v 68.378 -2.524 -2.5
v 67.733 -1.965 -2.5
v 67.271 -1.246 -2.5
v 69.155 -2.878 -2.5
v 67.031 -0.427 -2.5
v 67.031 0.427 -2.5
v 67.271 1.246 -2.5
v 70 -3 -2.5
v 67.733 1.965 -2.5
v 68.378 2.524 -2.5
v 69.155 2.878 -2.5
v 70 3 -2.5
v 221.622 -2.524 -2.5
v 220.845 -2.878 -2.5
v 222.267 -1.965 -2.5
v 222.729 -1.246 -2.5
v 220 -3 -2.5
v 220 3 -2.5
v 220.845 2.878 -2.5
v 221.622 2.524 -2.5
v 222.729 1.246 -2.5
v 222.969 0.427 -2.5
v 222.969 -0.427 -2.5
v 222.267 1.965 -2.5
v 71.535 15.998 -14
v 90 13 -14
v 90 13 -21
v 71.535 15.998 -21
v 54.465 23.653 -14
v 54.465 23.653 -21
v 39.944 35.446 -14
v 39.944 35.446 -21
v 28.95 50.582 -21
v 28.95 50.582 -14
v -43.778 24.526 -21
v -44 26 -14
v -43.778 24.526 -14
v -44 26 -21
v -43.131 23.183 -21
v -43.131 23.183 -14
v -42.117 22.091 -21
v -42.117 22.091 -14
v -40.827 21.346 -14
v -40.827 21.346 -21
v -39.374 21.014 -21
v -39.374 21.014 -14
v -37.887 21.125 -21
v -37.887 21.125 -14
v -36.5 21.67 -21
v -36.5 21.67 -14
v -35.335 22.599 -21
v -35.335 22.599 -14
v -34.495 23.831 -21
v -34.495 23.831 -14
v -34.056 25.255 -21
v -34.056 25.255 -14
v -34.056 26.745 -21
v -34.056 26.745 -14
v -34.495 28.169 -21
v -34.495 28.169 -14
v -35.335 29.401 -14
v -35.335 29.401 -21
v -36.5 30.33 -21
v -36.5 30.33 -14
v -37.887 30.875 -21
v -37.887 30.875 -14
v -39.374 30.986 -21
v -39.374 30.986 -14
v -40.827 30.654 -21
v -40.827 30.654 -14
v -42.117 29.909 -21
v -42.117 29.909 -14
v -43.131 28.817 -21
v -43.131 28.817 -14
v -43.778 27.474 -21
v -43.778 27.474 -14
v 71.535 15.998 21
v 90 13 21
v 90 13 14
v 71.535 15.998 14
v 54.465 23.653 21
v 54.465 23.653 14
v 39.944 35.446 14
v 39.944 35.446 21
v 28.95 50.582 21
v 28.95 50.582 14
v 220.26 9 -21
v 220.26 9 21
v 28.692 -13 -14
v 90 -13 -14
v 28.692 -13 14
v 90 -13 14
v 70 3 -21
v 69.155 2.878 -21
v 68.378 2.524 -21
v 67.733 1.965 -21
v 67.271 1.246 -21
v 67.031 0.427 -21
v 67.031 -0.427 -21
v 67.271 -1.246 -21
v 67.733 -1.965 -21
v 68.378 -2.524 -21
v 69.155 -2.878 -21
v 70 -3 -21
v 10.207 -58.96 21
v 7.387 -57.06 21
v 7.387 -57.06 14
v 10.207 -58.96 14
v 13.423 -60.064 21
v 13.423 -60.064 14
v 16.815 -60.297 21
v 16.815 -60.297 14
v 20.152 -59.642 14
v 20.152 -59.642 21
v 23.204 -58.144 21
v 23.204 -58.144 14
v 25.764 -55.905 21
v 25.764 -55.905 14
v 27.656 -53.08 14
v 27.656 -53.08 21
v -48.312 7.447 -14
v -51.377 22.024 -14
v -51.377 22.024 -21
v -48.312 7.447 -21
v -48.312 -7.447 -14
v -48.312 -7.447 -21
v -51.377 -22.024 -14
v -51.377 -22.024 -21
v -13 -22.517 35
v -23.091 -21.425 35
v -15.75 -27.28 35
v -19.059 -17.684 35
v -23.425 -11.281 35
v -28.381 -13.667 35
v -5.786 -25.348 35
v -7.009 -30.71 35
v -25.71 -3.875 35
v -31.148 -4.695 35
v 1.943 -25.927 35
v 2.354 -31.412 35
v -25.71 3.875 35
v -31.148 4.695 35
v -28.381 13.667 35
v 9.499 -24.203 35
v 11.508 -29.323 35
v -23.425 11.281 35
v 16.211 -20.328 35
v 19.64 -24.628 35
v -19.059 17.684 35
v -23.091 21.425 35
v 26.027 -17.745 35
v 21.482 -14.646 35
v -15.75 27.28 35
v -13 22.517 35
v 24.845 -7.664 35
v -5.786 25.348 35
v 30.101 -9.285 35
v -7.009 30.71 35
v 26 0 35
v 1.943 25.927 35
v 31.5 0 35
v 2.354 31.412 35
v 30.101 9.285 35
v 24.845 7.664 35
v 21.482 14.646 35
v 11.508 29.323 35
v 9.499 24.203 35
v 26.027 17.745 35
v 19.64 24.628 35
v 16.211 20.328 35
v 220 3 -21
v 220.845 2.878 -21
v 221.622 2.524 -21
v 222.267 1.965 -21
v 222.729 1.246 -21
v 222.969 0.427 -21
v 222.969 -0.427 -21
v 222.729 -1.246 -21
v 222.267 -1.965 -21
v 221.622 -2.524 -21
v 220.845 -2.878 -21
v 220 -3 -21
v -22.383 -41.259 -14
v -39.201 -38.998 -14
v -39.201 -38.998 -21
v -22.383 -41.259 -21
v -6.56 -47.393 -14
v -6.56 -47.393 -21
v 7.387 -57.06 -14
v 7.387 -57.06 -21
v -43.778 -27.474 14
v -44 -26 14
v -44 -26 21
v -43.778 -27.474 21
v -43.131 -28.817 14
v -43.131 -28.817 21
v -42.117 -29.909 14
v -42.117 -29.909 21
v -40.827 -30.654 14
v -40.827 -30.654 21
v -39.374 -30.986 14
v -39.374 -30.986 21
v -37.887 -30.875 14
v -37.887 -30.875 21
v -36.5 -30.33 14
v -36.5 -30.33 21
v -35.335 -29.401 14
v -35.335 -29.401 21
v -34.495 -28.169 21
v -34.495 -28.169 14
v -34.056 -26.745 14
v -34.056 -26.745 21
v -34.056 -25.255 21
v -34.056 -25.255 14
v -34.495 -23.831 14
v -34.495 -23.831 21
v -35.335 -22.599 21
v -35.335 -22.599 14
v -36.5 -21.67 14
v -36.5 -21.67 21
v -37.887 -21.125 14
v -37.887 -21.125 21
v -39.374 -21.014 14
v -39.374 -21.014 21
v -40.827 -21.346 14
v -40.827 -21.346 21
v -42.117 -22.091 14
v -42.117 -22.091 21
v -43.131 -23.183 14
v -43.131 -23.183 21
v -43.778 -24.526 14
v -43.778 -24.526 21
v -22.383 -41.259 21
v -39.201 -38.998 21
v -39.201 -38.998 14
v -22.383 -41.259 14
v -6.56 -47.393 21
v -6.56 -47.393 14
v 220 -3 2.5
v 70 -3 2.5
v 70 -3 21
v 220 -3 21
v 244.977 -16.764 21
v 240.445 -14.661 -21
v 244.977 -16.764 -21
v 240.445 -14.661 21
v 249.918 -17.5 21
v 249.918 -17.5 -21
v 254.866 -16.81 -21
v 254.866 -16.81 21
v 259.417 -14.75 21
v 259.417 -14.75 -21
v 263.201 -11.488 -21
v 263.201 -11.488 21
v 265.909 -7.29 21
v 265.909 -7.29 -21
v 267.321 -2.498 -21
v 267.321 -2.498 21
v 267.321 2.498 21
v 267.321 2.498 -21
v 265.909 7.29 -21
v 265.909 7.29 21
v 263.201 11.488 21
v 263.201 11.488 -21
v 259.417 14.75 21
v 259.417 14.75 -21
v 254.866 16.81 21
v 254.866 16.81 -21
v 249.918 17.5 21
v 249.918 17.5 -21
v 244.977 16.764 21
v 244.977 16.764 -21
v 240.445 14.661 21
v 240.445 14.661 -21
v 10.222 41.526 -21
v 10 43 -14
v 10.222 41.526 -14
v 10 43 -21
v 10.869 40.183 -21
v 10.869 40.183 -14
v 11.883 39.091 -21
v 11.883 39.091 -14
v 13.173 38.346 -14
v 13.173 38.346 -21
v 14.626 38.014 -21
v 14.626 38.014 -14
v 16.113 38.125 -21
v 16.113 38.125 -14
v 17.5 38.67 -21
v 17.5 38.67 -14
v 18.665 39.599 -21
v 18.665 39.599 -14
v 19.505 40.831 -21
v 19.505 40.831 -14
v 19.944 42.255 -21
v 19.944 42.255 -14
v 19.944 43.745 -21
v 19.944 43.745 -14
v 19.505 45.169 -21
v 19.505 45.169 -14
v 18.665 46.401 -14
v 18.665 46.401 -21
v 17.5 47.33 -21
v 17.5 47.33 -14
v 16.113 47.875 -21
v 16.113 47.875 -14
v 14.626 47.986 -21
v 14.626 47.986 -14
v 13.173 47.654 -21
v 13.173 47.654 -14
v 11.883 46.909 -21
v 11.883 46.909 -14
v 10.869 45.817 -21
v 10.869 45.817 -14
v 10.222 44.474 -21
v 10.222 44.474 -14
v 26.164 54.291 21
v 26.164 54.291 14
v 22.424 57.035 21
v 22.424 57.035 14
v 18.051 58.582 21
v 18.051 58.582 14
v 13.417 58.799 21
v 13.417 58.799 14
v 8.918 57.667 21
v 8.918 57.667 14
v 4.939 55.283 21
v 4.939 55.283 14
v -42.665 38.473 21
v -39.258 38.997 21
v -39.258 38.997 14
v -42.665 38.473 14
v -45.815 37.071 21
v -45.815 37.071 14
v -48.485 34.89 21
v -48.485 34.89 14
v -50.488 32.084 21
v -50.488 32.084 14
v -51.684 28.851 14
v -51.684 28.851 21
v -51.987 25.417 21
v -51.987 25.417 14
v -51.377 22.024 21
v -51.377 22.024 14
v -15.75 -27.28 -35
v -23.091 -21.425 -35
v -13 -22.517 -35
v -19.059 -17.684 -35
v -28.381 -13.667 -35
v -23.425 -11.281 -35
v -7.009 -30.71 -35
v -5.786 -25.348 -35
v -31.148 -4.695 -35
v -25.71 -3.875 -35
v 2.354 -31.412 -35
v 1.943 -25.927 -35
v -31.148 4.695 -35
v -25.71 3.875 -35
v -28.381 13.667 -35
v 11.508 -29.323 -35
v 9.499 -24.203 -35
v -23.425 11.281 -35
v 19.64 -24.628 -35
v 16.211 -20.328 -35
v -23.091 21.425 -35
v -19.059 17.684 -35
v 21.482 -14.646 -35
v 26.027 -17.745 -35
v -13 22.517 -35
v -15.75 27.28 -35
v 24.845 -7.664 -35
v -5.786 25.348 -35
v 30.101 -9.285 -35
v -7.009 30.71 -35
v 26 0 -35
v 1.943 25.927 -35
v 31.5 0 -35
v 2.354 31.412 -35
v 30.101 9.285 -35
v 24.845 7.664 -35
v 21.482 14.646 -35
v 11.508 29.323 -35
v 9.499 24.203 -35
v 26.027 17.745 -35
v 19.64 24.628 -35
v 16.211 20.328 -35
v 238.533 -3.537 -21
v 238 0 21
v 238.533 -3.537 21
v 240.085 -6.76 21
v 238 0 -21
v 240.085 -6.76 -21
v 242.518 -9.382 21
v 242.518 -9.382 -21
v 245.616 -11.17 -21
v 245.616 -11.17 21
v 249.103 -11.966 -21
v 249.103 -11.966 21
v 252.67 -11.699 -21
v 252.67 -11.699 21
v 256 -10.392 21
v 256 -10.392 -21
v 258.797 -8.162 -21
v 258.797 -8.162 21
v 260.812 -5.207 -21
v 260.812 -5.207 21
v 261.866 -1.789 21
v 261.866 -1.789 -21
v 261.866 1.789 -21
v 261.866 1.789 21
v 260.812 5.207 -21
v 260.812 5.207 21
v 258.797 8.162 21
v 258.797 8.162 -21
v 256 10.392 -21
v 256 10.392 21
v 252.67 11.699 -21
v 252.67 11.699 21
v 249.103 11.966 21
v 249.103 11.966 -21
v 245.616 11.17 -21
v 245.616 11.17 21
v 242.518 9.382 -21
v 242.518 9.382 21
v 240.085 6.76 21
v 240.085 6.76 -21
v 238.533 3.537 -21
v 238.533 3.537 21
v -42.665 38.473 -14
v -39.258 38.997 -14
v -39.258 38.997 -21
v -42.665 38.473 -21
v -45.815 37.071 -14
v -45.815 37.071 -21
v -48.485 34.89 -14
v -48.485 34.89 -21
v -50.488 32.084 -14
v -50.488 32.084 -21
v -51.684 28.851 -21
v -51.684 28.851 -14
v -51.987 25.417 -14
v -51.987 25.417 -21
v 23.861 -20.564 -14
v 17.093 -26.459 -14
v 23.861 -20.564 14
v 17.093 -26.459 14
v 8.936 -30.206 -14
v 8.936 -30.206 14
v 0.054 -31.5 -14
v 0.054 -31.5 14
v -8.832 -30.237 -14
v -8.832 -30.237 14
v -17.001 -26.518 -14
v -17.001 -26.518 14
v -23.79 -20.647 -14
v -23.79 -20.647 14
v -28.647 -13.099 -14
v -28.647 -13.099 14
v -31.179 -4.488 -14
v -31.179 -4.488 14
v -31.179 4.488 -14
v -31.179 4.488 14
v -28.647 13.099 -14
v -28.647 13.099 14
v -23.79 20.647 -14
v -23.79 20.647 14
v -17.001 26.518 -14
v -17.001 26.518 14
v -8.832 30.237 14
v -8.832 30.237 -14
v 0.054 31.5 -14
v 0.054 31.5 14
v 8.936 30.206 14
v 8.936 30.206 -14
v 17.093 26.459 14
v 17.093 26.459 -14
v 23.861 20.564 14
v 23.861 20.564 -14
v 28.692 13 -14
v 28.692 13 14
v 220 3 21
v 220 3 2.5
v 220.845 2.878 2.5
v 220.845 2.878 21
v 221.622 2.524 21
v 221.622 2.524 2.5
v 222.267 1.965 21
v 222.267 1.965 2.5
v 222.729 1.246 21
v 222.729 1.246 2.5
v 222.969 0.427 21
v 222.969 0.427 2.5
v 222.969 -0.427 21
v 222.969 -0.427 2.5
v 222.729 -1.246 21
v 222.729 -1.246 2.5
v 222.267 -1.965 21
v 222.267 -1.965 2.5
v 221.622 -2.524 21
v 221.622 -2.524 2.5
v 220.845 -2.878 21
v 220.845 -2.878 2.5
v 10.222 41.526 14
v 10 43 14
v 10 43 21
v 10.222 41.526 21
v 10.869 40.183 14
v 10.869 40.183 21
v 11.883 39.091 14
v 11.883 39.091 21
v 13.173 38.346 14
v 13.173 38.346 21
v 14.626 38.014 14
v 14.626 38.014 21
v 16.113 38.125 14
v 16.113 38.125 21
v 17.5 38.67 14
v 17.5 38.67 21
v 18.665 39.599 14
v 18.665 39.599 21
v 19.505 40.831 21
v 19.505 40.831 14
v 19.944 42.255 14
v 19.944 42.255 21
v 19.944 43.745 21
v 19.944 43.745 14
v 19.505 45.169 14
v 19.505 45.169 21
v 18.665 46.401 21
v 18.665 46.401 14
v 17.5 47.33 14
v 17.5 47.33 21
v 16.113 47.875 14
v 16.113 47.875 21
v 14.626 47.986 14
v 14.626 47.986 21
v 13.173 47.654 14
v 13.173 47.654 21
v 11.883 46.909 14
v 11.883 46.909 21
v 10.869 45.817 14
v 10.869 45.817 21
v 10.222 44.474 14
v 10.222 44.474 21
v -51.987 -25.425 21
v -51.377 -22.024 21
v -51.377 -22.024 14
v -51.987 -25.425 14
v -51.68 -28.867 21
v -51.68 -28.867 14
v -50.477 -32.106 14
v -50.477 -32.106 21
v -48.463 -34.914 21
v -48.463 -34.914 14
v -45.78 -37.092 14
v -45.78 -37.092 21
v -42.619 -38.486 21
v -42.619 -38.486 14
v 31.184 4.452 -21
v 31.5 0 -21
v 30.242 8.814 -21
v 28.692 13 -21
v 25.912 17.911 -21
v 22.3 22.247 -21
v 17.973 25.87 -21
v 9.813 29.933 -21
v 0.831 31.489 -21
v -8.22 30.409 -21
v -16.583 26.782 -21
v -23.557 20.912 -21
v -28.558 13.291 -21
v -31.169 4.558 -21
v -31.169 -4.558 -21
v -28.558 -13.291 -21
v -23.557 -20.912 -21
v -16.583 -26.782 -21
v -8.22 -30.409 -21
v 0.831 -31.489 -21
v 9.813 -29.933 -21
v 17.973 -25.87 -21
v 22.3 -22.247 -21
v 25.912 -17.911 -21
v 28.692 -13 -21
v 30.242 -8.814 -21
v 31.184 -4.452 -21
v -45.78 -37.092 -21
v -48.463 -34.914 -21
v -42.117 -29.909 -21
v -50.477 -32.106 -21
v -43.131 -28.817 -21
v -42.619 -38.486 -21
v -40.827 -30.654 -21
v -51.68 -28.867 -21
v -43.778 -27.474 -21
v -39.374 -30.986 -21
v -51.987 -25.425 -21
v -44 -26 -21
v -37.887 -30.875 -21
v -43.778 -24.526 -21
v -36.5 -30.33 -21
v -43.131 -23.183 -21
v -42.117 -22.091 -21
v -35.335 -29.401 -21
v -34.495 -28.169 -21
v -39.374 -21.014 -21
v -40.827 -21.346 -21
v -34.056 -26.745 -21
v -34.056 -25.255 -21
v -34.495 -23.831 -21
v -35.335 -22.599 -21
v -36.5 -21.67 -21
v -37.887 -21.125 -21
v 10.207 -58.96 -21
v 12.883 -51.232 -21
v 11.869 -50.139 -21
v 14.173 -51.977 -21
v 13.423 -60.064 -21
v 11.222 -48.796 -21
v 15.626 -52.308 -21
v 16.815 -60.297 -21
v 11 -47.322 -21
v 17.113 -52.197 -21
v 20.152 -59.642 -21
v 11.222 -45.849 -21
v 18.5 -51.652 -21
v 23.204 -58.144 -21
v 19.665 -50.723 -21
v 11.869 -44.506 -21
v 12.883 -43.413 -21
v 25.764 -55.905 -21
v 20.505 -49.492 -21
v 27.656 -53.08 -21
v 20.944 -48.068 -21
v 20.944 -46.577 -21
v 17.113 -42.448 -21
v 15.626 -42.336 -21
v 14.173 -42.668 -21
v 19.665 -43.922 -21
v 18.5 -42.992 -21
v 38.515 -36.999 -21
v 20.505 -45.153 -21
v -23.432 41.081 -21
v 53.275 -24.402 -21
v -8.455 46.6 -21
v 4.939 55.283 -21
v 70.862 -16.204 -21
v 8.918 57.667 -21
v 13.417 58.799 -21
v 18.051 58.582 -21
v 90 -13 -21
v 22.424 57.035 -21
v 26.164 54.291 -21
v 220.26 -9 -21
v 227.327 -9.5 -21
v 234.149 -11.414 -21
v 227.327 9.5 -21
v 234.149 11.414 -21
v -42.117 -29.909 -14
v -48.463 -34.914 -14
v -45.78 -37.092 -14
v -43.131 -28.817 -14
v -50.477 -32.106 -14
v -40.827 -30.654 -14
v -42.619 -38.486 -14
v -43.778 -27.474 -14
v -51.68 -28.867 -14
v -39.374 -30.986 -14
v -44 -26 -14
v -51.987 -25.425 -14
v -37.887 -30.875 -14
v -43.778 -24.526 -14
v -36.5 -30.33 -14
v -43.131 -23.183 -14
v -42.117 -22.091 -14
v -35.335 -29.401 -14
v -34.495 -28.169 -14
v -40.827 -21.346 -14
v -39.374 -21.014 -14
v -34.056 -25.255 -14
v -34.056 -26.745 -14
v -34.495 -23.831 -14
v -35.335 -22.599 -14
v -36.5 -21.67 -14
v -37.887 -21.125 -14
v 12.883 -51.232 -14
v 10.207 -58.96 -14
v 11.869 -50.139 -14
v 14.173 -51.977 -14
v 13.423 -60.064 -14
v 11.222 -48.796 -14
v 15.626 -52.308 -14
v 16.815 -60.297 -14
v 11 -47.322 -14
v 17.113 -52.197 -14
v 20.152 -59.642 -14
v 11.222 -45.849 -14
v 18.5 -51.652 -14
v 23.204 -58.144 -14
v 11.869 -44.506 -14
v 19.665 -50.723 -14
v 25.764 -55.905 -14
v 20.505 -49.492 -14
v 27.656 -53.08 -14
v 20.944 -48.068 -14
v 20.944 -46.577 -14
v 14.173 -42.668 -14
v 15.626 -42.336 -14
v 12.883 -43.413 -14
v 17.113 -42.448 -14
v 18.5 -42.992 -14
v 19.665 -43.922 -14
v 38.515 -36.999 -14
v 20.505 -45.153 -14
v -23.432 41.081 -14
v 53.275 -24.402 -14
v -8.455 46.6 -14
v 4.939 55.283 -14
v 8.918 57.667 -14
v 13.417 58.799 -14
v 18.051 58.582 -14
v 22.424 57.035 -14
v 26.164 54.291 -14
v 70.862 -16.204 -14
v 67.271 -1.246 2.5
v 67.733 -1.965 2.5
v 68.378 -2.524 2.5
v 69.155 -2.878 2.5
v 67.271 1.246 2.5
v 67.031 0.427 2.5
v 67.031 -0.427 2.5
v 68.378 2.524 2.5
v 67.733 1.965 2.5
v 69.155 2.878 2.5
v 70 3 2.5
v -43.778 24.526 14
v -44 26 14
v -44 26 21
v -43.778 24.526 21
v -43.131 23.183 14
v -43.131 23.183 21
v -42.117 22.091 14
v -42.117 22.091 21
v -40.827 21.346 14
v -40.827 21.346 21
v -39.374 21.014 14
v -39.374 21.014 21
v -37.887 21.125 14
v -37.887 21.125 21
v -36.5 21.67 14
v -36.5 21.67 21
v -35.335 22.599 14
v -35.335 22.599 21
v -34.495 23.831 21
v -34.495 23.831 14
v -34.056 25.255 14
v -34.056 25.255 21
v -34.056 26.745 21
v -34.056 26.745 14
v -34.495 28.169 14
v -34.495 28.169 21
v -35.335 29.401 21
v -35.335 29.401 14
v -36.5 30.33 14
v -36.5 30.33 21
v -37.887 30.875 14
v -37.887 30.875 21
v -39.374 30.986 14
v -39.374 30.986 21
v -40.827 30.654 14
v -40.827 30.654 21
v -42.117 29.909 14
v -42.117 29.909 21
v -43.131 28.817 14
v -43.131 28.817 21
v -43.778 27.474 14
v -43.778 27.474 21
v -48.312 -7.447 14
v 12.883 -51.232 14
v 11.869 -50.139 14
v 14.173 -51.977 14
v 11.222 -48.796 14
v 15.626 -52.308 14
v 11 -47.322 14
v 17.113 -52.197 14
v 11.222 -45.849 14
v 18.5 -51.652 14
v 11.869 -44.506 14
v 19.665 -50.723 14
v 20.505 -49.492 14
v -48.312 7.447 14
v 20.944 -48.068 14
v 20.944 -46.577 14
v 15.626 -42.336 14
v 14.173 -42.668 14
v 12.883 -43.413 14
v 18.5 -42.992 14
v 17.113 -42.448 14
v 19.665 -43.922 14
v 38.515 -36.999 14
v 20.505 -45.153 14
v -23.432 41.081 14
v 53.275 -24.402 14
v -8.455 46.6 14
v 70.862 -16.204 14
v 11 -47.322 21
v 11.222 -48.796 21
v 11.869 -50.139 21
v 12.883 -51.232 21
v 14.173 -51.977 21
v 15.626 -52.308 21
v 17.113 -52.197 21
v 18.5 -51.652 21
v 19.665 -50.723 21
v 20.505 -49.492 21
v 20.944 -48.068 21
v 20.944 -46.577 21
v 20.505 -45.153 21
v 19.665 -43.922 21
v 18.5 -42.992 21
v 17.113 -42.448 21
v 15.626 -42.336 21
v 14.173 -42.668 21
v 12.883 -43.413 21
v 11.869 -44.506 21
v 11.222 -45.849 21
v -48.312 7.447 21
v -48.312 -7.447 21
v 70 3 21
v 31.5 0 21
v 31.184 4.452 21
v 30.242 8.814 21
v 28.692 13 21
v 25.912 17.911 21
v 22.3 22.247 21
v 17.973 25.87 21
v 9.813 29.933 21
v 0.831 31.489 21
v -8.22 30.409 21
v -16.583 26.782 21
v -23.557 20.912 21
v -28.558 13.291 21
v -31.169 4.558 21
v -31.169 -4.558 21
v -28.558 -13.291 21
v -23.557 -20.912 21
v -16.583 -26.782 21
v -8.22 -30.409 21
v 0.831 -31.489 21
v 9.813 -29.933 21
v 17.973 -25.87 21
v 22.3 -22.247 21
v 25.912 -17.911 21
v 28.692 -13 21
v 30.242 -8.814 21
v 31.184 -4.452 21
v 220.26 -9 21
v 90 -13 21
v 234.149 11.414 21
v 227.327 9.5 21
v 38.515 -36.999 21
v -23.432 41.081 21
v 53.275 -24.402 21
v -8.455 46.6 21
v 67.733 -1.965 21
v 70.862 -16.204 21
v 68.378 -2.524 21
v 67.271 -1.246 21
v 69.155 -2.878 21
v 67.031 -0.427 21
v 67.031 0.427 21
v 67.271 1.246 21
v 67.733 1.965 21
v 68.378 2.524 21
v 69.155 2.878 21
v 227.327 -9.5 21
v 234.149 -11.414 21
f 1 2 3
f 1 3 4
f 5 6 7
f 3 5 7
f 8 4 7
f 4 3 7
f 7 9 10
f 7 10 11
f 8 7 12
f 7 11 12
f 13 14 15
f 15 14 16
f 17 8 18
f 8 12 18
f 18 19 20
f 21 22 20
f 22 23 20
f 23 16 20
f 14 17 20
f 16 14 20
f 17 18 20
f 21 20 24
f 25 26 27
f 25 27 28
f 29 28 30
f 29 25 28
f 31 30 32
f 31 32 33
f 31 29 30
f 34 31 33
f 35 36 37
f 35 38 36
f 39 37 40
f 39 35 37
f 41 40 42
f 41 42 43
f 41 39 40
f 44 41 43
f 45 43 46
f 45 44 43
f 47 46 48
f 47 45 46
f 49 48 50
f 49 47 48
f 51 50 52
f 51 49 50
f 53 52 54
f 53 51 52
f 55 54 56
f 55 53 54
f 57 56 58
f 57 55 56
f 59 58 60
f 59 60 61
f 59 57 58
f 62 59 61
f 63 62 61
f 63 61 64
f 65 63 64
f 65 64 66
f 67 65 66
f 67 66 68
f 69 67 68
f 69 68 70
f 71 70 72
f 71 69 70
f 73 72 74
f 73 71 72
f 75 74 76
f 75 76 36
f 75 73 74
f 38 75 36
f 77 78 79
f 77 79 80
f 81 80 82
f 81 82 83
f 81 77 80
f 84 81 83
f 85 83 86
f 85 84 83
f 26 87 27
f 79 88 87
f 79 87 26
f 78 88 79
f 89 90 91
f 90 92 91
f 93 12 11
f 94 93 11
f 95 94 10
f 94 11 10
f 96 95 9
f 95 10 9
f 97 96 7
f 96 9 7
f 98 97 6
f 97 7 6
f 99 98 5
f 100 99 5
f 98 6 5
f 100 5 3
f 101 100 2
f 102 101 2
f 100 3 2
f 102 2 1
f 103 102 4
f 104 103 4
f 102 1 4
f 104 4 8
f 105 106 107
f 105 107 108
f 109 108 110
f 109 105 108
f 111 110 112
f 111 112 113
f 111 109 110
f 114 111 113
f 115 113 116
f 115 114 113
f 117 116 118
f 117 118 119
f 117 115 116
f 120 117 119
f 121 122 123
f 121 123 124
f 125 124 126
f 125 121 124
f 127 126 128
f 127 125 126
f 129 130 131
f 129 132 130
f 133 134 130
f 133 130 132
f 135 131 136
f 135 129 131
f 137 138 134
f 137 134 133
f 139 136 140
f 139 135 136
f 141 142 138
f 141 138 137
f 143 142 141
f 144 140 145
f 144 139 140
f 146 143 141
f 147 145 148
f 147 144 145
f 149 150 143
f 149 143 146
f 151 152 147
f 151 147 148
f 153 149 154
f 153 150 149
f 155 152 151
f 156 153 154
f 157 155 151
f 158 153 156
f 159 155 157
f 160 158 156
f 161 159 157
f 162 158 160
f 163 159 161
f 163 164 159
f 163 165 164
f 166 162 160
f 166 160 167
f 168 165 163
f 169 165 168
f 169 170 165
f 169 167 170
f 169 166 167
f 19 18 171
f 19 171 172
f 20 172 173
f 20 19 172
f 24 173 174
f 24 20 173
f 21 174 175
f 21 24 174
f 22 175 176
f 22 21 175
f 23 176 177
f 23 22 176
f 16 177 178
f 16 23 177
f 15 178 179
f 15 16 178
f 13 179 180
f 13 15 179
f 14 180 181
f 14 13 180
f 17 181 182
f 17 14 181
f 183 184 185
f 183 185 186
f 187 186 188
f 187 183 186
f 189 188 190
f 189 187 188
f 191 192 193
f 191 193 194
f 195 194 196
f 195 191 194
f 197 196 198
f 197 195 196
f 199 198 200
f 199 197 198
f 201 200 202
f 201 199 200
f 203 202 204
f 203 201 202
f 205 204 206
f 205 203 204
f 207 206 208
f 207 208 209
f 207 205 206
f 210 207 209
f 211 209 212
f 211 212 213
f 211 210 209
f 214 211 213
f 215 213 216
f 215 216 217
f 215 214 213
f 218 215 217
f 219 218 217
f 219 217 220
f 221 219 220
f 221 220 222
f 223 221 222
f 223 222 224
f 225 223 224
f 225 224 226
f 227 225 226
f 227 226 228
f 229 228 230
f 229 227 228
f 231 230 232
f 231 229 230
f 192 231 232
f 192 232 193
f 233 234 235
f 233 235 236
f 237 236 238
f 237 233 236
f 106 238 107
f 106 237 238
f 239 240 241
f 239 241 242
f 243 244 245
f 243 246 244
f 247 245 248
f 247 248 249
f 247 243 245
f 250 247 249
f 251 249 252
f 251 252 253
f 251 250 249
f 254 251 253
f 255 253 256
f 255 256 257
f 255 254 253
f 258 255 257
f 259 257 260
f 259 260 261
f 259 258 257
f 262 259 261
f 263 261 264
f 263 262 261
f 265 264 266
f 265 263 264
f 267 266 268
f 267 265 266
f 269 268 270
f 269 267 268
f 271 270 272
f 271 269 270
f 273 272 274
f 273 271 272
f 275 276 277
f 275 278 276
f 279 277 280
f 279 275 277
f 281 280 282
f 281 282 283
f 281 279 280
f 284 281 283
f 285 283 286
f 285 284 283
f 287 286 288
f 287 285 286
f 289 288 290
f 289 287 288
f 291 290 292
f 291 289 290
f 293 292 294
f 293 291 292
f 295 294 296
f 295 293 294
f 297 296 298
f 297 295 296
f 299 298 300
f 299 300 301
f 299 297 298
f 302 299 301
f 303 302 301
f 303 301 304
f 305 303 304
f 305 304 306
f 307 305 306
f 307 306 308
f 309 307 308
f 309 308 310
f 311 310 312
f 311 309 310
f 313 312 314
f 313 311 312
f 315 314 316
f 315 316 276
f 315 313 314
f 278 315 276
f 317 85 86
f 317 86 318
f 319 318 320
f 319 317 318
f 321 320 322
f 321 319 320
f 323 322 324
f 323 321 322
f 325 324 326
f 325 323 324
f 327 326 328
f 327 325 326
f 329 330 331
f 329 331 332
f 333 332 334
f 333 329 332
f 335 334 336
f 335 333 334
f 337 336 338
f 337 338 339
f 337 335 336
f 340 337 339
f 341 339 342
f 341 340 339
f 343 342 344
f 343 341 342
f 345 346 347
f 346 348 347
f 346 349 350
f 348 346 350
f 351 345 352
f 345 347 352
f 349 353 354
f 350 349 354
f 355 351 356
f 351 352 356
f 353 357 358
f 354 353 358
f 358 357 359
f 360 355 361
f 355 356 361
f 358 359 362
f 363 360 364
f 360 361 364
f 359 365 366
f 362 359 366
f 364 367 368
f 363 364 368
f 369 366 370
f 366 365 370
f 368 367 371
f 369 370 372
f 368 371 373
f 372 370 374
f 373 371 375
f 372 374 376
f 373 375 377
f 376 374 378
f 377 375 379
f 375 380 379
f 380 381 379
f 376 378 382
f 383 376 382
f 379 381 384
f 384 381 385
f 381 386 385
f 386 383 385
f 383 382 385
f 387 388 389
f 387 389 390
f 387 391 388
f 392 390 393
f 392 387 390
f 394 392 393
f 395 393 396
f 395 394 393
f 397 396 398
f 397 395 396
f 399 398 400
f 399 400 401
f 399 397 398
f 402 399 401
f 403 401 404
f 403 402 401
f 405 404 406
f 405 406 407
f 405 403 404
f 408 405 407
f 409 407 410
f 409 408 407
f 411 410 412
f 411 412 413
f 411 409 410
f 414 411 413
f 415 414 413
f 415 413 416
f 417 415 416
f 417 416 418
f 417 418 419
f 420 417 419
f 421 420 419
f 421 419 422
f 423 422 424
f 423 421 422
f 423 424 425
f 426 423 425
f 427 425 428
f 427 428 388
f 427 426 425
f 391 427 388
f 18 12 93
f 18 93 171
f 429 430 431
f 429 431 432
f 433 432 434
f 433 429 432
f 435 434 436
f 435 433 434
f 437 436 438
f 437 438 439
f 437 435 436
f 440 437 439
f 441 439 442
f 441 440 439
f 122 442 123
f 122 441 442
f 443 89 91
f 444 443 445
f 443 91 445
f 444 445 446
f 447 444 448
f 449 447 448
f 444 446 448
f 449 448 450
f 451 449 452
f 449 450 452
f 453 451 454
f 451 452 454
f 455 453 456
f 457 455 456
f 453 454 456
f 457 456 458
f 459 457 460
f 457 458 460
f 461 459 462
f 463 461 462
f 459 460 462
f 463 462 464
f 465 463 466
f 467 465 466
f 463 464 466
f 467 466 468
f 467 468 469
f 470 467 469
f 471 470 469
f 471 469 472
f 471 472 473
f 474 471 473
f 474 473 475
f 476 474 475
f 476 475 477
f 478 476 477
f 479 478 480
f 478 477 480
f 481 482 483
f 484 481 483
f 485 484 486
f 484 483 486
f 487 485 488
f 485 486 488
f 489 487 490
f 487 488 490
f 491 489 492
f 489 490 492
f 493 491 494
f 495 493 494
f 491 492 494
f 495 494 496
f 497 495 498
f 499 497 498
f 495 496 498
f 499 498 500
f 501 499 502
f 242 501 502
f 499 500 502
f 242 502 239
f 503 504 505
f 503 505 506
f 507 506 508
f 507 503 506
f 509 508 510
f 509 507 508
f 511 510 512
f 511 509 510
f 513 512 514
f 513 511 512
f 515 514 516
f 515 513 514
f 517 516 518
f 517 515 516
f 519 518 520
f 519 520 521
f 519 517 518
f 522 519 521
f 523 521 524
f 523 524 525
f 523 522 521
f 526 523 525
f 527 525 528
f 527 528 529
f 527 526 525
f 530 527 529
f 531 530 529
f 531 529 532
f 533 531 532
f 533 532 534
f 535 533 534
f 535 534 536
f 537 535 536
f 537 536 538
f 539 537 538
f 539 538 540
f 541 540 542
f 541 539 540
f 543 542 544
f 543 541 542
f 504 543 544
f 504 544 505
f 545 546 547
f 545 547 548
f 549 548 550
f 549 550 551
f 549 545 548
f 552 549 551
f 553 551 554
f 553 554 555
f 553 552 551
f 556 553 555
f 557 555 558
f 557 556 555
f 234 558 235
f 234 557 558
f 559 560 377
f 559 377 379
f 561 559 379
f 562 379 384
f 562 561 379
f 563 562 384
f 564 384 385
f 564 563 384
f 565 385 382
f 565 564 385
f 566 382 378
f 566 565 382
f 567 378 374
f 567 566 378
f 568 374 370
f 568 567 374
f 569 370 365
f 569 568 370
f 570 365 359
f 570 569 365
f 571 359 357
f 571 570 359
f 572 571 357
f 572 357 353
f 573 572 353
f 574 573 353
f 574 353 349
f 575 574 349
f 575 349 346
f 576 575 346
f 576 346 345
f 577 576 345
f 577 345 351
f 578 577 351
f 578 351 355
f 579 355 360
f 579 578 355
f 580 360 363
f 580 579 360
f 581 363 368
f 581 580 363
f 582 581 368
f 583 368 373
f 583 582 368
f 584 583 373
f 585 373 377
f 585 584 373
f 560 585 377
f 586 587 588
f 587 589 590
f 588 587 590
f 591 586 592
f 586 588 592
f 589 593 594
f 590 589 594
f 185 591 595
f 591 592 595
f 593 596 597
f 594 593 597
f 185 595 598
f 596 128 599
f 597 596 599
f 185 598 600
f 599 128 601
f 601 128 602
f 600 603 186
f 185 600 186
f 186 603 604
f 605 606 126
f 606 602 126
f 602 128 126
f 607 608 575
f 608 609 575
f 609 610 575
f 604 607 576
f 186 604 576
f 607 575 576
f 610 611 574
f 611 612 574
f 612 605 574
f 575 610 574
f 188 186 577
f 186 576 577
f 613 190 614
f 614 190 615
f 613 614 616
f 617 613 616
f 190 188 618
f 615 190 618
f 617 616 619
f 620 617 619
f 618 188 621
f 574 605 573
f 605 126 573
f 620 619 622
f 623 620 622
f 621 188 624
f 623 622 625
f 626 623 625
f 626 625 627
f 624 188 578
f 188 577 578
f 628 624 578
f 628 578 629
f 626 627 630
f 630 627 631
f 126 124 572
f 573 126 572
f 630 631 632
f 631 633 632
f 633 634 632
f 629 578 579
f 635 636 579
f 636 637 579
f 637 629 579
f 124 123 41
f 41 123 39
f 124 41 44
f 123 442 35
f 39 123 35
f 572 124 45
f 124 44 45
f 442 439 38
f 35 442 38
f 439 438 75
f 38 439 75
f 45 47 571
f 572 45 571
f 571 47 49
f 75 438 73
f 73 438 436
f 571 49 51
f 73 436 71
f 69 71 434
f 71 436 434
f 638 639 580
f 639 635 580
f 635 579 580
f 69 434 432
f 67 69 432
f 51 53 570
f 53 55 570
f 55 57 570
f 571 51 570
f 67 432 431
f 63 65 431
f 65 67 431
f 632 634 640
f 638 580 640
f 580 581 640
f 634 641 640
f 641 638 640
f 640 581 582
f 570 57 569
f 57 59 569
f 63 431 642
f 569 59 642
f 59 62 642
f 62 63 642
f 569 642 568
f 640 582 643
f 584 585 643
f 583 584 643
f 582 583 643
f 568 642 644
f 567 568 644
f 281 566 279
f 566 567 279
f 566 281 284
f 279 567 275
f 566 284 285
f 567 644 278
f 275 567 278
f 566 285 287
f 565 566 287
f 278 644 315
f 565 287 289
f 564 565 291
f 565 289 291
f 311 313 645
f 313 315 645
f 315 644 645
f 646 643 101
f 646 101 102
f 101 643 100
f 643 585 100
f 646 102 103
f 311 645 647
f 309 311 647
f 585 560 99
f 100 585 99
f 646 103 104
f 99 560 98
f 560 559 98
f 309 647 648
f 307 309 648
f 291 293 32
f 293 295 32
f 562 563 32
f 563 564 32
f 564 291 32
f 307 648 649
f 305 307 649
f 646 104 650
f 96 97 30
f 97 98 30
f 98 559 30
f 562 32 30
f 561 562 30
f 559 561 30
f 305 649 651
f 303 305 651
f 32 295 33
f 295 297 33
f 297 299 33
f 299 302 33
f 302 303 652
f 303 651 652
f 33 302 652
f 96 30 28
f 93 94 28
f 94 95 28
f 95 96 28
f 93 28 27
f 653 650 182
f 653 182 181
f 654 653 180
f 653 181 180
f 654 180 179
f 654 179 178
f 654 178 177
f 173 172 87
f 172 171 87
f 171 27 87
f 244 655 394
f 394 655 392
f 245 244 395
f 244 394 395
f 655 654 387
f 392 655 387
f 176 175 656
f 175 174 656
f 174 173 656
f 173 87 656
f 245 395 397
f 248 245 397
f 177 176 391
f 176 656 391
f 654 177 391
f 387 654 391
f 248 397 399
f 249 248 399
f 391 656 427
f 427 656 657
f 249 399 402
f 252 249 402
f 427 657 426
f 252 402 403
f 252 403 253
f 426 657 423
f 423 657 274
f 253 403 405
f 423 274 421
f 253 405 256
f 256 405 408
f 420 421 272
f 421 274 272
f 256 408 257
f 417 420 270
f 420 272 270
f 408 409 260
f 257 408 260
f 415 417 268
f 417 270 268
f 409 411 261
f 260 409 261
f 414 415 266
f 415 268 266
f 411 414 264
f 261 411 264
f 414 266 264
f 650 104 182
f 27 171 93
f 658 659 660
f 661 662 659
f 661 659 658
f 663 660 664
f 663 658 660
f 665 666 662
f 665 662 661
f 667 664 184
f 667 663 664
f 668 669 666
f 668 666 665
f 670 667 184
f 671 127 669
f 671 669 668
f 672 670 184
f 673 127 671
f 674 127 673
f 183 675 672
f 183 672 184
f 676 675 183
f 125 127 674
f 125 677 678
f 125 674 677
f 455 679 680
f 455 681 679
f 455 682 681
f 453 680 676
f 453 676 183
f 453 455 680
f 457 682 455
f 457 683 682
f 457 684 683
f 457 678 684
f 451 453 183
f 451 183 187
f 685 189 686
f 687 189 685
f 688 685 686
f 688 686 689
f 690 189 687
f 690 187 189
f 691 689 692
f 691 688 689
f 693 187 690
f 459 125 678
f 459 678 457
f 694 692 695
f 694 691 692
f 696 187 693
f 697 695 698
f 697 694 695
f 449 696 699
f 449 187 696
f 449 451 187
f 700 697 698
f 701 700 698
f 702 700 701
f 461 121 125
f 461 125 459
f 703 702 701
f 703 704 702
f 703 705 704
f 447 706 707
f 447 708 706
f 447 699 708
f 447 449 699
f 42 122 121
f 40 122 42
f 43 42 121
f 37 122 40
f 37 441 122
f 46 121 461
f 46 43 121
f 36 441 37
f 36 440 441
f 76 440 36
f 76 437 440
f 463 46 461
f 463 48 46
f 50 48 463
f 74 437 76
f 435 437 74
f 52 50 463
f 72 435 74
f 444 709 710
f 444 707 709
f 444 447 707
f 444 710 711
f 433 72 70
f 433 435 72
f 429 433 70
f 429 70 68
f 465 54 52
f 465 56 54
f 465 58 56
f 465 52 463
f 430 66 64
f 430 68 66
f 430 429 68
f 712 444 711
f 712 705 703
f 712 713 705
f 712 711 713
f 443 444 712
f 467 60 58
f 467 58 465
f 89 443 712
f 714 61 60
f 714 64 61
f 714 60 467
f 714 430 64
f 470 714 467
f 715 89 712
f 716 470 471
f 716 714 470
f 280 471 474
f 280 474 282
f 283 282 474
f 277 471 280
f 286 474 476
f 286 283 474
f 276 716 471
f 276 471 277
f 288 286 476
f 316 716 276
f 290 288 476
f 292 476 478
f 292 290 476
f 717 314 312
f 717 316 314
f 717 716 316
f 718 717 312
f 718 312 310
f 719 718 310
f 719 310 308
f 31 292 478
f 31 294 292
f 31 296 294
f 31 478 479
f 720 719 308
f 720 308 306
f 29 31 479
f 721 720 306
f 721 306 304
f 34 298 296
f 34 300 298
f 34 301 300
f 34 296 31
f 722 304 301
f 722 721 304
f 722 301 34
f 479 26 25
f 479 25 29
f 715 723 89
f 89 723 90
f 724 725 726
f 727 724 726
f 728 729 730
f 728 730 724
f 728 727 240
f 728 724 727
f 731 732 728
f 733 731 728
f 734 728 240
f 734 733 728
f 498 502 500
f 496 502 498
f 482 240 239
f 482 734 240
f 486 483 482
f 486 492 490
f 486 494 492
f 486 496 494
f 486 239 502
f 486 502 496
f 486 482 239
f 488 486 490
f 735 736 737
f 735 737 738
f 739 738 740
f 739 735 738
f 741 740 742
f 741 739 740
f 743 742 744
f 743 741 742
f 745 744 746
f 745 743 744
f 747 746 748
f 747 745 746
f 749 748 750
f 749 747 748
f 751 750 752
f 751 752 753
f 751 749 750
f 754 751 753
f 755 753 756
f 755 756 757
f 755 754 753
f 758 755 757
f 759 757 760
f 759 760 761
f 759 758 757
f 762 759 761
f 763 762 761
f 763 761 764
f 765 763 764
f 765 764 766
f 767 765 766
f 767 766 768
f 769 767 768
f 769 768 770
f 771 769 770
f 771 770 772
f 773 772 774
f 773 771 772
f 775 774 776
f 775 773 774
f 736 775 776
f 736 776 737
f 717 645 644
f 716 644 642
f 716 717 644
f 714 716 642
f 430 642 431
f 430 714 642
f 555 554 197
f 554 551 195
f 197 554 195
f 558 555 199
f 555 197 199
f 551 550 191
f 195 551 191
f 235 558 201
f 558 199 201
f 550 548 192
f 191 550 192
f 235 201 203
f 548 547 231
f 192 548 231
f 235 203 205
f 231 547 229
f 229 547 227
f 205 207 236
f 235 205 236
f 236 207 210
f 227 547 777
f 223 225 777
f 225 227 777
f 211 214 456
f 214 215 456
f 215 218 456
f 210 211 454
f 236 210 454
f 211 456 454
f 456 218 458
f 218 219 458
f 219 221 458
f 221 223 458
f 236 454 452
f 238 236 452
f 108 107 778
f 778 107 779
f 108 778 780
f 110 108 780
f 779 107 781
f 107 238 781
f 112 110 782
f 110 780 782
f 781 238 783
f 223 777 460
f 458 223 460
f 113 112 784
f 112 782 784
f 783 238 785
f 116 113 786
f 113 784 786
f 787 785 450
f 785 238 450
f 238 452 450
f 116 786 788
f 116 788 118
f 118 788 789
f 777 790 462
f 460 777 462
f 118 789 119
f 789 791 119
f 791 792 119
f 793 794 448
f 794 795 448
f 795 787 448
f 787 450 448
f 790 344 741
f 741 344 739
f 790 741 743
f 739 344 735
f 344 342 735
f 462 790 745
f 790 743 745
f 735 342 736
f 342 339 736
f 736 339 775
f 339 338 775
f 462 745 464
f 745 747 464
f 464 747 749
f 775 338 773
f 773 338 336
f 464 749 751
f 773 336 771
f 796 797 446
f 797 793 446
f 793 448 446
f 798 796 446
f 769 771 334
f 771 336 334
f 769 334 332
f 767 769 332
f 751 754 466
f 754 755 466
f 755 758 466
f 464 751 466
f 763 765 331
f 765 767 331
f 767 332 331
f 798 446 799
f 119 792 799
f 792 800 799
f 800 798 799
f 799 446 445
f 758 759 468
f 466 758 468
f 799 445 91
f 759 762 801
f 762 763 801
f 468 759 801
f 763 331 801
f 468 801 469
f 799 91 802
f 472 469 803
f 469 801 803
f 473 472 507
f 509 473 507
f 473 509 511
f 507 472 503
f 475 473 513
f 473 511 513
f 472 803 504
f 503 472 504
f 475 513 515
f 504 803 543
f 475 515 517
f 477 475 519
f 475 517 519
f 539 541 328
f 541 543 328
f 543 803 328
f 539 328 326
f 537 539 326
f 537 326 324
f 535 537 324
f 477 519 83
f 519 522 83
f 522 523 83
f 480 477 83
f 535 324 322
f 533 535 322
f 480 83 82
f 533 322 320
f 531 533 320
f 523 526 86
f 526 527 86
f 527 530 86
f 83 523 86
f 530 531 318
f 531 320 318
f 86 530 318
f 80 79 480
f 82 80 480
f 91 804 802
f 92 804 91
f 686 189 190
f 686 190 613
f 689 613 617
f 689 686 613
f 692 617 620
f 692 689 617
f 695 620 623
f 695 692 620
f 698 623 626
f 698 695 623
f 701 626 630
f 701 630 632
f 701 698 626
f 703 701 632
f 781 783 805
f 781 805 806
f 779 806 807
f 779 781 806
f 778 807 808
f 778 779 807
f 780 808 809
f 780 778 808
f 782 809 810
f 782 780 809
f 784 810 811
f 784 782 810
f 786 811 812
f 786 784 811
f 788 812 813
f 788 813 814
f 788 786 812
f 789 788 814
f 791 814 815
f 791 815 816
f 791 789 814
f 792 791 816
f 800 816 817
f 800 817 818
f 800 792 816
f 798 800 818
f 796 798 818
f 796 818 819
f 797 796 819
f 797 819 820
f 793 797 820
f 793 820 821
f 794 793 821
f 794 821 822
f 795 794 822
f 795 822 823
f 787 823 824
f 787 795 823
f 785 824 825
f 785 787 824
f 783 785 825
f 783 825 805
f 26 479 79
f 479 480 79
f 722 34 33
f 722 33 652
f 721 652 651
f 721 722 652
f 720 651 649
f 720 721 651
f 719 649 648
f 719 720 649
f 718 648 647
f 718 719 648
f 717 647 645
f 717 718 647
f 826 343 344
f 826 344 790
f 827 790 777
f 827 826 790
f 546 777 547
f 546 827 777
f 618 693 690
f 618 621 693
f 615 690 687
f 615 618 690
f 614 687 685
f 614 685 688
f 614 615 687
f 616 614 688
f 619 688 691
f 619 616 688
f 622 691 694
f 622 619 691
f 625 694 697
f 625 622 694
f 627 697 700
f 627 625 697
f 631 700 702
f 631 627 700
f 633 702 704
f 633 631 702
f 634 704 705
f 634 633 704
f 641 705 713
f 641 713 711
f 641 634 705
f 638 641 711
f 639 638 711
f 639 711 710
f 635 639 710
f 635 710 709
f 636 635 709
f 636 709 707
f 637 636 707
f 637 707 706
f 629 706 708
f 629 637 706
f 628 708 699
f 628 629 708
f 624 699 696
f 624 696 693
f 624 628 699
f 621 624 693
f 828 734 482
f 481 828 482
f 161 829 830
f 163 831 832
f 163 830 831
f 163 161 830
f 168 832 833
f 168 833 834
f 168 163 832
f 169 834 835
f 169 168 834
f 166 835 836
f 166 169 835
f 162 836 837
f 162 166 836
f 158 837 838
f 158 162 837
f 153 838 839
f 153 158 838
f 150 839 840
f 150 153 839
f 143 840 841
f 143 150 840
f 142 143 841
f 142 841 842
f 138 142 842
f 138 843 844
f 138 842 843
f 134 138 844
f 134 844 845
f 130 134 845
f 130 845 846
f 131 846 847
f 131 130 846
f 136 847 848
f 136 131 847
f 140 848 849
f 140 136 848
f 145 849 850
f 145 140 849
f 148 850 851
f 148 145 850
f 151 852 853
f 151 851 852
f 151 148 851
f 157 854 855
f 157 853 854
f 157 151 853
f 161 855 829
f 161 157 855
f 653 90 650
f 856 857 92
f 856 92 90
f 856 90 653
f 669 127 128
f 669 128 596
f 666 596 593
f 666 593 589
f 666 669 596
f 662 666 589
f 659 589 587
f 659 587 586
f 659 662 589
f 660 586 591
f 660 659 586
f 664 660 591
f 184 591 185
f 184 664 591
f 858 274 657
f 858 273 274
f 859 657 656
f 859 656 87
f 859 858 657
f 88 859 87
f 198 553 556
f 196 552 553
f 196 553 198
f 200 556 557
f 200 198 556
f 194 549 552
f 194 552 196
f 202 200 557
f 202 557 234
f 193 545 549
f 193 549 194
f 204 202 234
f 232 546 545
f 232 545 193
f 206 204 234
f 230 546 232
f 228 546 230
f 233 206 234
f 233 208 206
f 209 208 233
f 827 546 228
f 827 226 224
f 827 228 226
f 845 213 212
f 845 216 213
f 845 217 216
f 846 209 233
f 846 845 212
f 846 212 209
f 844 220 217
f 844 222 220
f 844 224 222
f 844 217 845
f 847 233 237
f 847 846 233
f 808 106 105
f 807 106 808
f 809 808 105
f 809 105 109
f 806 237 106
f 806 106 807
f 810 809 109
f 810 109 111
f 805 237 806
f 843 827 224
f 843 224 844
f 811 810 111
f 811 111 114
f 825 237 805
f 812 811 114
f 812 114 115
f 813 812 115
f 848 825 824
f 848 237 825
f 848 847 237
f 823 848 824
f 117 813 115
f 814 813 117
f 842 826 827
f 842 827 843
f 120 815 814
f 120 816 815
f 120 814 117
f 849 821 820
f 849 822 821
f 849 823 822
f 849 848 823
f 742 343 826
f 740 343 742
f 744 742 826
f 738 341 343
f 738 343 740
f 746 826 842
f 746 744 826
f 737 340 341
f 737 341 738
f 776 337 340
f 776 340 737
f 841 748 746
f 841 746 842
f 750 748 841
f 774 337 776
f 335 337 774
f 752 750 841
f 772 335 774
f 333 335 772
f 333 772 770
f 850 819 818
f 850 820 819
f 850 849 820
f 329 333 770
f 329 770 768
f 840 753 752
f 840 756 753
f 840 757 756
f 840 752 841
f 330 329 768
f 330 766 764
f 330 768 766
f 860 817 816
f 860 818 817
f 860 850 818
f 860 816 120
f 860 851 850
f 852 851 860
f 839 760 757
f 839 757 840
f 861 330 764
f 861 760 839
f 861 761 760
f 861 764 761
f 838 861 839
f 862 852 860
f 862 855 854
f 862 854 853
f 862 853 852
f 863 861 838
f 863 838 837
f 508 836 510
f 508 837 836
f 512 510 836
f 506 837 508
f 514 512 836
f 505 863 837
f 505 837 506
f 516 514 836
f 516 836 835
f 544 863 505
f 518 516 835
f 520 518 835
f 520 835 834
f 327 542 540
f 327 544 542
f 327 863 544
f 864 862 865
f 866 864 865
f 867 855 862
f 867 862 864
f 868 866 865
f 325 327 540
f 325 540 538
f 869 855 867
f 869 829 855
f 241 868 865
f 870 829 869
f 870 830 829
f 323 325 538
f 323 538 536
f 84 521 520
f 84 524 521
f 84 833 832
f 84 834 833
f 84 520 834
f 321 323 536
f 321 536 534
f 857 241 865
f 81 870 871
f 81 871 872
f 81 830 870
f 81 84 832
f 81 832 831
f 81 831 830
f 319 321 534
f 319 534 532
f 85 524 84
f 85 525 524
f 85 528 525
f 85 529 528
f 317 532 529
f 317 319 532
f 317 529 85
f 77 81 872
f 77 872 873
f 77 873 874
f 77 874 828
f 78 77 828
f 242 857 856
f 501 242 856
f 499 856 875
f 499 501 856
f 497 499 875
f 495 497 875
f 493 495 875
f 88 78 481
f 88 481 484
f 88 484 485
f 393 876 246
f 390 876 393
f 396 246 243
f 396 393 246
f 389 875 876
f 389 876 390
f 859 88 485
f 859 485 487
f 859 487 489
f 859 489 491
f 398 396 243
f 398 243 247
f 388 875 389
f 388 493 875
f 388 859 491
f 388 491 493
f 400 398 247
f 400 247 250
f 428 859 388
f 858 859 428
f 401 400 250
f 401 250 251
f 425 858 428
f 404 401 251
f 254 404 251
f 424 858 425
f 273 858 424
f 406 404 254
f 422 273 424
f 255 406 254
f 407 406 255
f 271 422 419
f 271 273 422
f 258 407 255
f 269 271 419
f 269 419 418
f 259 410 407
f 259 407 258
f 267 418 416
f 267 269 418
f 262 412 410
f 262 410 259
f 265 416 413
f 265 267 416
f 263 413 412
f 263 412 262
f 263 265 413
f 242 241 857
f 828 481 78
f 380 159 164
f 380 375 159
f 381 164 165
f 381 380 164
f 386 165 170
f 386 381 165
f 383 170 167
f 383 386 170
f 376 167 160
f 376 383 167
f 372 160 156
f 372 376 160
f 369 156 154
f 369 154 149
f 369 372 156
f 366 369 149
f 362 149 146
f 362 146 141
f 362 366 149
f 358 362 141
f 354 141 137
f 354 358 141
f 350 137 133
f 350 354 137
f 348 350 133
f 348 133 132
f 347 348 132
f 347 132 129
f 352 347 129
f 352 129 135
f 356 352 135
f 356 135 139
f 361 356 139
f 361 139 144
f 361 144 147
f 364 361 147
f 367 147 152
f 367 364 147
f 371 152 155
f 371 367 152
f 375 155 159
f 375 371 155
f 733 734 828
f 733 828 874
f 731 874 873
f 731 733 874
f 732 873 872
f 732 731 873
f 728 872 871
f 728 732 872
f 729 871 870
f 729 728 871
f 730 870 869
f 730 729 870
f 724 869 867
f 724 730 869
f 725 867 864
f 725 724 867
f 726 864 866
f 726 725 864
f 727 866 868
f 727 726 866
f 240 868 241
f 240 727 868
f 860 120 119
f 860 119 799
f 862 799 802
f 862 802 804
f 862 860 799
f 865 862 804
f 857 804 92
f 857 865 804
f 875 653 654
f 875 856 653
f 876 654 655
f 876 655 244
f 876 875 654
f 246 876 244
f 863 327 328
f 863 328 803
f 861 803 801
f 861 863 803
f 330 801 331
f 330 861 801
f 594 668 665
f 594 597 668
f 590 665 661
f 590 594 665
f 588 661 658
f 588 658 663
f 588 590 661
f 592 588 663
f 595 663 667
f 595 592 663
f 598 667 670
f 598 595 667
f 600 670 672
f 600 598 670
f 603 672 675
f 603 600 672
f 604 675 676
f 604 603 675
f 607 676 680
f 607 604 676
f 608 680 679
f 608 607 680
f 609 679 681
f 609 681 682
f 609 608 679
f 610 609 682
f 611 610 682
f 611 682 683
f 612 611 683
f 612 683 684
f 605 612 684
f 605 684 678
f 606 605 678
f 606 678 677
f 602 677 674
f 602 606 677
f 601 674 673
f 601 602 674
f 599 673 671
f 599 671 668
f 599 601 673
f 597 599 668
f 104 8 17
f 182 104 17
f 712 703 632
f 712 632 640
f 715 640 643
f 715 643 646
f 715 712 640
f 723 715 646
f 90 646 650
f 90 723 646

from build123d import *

# Parameters (mm, degrees)
SKETCH1_R           = 31.5
SKETCH1_R_2         = 26
BOSS_EXTRUDE1_DEPTH = 35
SKETCH1_9_W         = 20
SKETCH1_9_H         = 6
SKETCH1_9_R         = 12
BOSS_EXTRUDE2_DEPTH = 21
BOSS_EXTRUDE4_START = -21
SKETCH1_13_W        = 20
SKETCH1_13_H        = 6
BOSS_EXTRUDE4_DEPTH = 42
FILLET1_R           = 72
CUT_EXTRUDE1_START  = -2.5
SKETCH1_10_W        = 150
SKETCH1_10_H        = 6
CUT_EXTRUDE1_DEPTH  = 270.112775841
SKETCH1_11_R        = 5
BOSS_EXTRUDE3_DEPTH = 21
SKETCH1_12_R        = 5
CUT_EXTRUDE2_DEPTH  = 14


with BuildPart() as part:
    # Sketch1 → Boss-Extrude1 (new, symmetric)
    with BuildSketch(Plane.XY):
        Circle(SKETCH1_R)
        Circle(SKETCH1_R_2, mode=Mode.SUBTRACT)
    extrude(amount=BOSS_EXTRUDE1_DEPTH, both=True)

    # Sketch1<9> → Boss-Extrude2 (add, symmetric)
    with BuildSketch(Plane.XY):
        with BuildLine():
            ThreePointArc((240.444891614, 14.661169931), (230.786453061, 10.283897205), (220.260411081, 9))
            Line((220.260411081, 9), (90, 13))
            Line((90, 13), (28.692333471, 13))
            ThreePointArc((28.692333471, 13), (31.5, 0), (28.692333471, -13))
            Line((28.692333471, -13), (90, -13))
            Line((90, -13), (220.260411081, -9))
            ThreePointArc((220.260411081, -9), (230.786453061, -10.283897205), (240.444891614, -14.661169931))
            ThreePointArc((240.444891614, -14.661169931), (267.5, 0), (240.444891614, 14.661169931))
        make_face()
        with Locations((80, 0)):
            Rectangle(SKETCH1_9_W, SKETCH1_9_H, mode=Mode.SUBTRACT)
        with Locations(Location((250, 0, 0), (0, 0, 180))):
            Circle(SKETCH1_9_R, mode=Mode.SUBTRACT)
    extrude(amount=BOSS_EXTRUDE2_DEPTH, both=True)

    # Sketch1<13> → Boss-Extrude4 (add)
    with BuildSketch(Plane.XY.offset(BOSS_EXTRUDE4_START)):
        with Locations((80, 0)):
            Rectangle(SKETCH1_13_W, SKETCH1_13_H)
    extrude(amount=BOSS_EXTRUDE4_DEPTH)

    # Fillet1
    fillet1_edges = [part.edges().sort_by_distance(p)[0] for p in [
        (28.692333471, 13, 0),
        (28.692333471, -13, 0),
    ]]
    fillet(fillet1_edges, radius=FILLET1_R)

    # Sketch1<10> → Cut-Extrude1 (cut, through all)
    with BuildSketch(Plane.XY.offset(CUT_EXTRUDE1_START)):
        with Locations((145, 0)):
            Rectangle(SKETCH1_10_W, SKETCH1_10_H)
        with BuildLine():
            ThreePointArc((220, 3), (223, 0), (220, -3))
            Line((220, -3), (220, 3))
        make_face()
        with BuildLine():
            Line((70, -3), (70, 3))
            ThreePointArc((70, 3), (67, 0), (70, -3))
        make_face()
    cut_extrude1 = extrude(amount=-CUT_EXTRUDE1_DEPTH, mode=Mode.SUBTRACT)

    # Mirror1: Cut-Extrude1 across plane
    add(cut_extrude1.mirror(Plane.XY), mode=Mode.SUBTRACT)

    # Sketch1<11> → Boss-Extrude3 (add, symmetric)
    with BuildSketch(Plane.XY):
        with BuildLine():
            Line((28.692333471, 13), (90, 13))
            ThreePointArc((90, 13), (54.465075477, 23.652725045), (28.950381961, 50.582482314))
            ThreePointArc((28.950381961, 50.582482314), (18.050555131, 58.582082925), (4.938808192, 55.283306326))
            ThreePointArc((4.938808192, 55.283306326), (-15.790013542, 43.424058768), (-39.257670087, 38.997446139))
            ThreePointArc((-39.257670087, 38.997446139), (-49.580007549, 33.5540347), (-51.376901133, 22.023529412))
            ThreePointArc((-51.376901133, 22.023529412), (-47.925892025, 0), (-51.376901133, -22.023529412))
            ThreePointArc((-51.376901133, -22.023529412), (-49.563579479, -33.576990734), (-39.201221462, -38.998442596))
            ThreePointArc((-39.201221462, -38.998442596), (-14.290092236, -43.85808942), (7.387013832, -57.059740797))
            ThreePointArc((7.387013832, -57.059740797), (18.504940725, -60.078747549), (27.655633909, -53.079639433))
            ThreePointArc((27.655633909, -53.079639433), (53.274598705, -24.401721259), (90, -13))
            Line((90, -13), (28.692333471, -13))
            ThreePointArc((28.692333471, -13), (-31.5, 0), (28.692333471, 13))
        make_face()
        with Locations(Location((16, -47.322365932, 0), (0, 0, 180))):
            Circle(SKETCH1_11_R, mode=Mode.SUBTRACT)
        with Locations(Location((-39, -26, 0), (0, 0, 180))):
            Circle(SKETCH1_11_R, mode=Mode.SUBTRACT)
        with Locations(Location((-39, 26, 0), (0, 0, 180))):
            Circle(SKETCH1_11_R, mode=Mode.SUBTRACT)
        with Locations(Location((15, 43, 0), (0, 0, 180))):
            Circle(SKETCH1_11_R, mode=Mode.SUBTRACT)
    extrude(amount=BOSS_EXTRUDE3_DEPTH, both=True)

    # Sketch1<12> → Cut-Extrude2 (cut, symmetric)
    with BuildSketch(Plane.XY):
        with BuildLine():
            Line((28.692333471, 13), (90, 13))
            ThreePointArc((90, 13), (54.465075477, 23.652725045), (28.950381961, 50.582482314))
            ThreePointArc((28.950381961, 50.582482314), (18.050555131, 58.582082925), (4.938808192, 55.283306326))
            ThreePointArc((4.938808192, 55.283306326), (-15.790013542, 43.424058768), (-39.257670087, 38.997446139))
            ThreePointArc((-39.257670087, 38.997446139), (-49.580007549, 33.5540347), (-51.376901133, 22.023529412))
            ThreePointArc((-51.376901133, 22.023529412), (-47.925892025, 0), (-51.376901133, -22.023529412))
            ThreePointArc((-51.376901133, -22.023529412), (-49.563579479, -33.576990734), (-39.201221462, -38.998442596))
            ThreePointArc((-39.201221462, -38.998442596), (-14.290092236, -43.85808942), (7.387013832, -57.059740797))
            ThreePointArc((7.387013832, -57.059740797), (18.504940725, -60.078747549), (27.655633909, -53.079639433))
            ThreePointArc((27.655633909, -53.079639433), (53.274598705, -24.401721259), (90, -13))
            Line((90, -13), (28.692333471, -13))
            ThreePointArc((28.692333471, -13), (-31.5, 0), (28.692333471, 13))
        make_face()
        with Locations(Location((16, -47.322365932, 0), (0, 0, 180))):
            Circle(SKETCH1_12_R, mode=Mode.SUBTRACT)
        with Locations(Location((-39, -26, 0), (0, 0, 180))):
            Circle(SKETCH1_12_R, mode=Mode.SUBTRACT)
        with Locations(Location((-39, 26, 0), (0, 0, 180))):
            Circle(SKETCH1_12_R, mode=Mode.SUBTRACT)
        with Locations(Location((15, 43, 0), (0, 0, 180))):
            Circle(SKETCH1_12_R, mode=Mode.SUBTRACT)
    extrude(amount=CUT_EXTRUDE2_DEPTH, both=True, mode=Mode.SUBTRACT)


solid = part.part
